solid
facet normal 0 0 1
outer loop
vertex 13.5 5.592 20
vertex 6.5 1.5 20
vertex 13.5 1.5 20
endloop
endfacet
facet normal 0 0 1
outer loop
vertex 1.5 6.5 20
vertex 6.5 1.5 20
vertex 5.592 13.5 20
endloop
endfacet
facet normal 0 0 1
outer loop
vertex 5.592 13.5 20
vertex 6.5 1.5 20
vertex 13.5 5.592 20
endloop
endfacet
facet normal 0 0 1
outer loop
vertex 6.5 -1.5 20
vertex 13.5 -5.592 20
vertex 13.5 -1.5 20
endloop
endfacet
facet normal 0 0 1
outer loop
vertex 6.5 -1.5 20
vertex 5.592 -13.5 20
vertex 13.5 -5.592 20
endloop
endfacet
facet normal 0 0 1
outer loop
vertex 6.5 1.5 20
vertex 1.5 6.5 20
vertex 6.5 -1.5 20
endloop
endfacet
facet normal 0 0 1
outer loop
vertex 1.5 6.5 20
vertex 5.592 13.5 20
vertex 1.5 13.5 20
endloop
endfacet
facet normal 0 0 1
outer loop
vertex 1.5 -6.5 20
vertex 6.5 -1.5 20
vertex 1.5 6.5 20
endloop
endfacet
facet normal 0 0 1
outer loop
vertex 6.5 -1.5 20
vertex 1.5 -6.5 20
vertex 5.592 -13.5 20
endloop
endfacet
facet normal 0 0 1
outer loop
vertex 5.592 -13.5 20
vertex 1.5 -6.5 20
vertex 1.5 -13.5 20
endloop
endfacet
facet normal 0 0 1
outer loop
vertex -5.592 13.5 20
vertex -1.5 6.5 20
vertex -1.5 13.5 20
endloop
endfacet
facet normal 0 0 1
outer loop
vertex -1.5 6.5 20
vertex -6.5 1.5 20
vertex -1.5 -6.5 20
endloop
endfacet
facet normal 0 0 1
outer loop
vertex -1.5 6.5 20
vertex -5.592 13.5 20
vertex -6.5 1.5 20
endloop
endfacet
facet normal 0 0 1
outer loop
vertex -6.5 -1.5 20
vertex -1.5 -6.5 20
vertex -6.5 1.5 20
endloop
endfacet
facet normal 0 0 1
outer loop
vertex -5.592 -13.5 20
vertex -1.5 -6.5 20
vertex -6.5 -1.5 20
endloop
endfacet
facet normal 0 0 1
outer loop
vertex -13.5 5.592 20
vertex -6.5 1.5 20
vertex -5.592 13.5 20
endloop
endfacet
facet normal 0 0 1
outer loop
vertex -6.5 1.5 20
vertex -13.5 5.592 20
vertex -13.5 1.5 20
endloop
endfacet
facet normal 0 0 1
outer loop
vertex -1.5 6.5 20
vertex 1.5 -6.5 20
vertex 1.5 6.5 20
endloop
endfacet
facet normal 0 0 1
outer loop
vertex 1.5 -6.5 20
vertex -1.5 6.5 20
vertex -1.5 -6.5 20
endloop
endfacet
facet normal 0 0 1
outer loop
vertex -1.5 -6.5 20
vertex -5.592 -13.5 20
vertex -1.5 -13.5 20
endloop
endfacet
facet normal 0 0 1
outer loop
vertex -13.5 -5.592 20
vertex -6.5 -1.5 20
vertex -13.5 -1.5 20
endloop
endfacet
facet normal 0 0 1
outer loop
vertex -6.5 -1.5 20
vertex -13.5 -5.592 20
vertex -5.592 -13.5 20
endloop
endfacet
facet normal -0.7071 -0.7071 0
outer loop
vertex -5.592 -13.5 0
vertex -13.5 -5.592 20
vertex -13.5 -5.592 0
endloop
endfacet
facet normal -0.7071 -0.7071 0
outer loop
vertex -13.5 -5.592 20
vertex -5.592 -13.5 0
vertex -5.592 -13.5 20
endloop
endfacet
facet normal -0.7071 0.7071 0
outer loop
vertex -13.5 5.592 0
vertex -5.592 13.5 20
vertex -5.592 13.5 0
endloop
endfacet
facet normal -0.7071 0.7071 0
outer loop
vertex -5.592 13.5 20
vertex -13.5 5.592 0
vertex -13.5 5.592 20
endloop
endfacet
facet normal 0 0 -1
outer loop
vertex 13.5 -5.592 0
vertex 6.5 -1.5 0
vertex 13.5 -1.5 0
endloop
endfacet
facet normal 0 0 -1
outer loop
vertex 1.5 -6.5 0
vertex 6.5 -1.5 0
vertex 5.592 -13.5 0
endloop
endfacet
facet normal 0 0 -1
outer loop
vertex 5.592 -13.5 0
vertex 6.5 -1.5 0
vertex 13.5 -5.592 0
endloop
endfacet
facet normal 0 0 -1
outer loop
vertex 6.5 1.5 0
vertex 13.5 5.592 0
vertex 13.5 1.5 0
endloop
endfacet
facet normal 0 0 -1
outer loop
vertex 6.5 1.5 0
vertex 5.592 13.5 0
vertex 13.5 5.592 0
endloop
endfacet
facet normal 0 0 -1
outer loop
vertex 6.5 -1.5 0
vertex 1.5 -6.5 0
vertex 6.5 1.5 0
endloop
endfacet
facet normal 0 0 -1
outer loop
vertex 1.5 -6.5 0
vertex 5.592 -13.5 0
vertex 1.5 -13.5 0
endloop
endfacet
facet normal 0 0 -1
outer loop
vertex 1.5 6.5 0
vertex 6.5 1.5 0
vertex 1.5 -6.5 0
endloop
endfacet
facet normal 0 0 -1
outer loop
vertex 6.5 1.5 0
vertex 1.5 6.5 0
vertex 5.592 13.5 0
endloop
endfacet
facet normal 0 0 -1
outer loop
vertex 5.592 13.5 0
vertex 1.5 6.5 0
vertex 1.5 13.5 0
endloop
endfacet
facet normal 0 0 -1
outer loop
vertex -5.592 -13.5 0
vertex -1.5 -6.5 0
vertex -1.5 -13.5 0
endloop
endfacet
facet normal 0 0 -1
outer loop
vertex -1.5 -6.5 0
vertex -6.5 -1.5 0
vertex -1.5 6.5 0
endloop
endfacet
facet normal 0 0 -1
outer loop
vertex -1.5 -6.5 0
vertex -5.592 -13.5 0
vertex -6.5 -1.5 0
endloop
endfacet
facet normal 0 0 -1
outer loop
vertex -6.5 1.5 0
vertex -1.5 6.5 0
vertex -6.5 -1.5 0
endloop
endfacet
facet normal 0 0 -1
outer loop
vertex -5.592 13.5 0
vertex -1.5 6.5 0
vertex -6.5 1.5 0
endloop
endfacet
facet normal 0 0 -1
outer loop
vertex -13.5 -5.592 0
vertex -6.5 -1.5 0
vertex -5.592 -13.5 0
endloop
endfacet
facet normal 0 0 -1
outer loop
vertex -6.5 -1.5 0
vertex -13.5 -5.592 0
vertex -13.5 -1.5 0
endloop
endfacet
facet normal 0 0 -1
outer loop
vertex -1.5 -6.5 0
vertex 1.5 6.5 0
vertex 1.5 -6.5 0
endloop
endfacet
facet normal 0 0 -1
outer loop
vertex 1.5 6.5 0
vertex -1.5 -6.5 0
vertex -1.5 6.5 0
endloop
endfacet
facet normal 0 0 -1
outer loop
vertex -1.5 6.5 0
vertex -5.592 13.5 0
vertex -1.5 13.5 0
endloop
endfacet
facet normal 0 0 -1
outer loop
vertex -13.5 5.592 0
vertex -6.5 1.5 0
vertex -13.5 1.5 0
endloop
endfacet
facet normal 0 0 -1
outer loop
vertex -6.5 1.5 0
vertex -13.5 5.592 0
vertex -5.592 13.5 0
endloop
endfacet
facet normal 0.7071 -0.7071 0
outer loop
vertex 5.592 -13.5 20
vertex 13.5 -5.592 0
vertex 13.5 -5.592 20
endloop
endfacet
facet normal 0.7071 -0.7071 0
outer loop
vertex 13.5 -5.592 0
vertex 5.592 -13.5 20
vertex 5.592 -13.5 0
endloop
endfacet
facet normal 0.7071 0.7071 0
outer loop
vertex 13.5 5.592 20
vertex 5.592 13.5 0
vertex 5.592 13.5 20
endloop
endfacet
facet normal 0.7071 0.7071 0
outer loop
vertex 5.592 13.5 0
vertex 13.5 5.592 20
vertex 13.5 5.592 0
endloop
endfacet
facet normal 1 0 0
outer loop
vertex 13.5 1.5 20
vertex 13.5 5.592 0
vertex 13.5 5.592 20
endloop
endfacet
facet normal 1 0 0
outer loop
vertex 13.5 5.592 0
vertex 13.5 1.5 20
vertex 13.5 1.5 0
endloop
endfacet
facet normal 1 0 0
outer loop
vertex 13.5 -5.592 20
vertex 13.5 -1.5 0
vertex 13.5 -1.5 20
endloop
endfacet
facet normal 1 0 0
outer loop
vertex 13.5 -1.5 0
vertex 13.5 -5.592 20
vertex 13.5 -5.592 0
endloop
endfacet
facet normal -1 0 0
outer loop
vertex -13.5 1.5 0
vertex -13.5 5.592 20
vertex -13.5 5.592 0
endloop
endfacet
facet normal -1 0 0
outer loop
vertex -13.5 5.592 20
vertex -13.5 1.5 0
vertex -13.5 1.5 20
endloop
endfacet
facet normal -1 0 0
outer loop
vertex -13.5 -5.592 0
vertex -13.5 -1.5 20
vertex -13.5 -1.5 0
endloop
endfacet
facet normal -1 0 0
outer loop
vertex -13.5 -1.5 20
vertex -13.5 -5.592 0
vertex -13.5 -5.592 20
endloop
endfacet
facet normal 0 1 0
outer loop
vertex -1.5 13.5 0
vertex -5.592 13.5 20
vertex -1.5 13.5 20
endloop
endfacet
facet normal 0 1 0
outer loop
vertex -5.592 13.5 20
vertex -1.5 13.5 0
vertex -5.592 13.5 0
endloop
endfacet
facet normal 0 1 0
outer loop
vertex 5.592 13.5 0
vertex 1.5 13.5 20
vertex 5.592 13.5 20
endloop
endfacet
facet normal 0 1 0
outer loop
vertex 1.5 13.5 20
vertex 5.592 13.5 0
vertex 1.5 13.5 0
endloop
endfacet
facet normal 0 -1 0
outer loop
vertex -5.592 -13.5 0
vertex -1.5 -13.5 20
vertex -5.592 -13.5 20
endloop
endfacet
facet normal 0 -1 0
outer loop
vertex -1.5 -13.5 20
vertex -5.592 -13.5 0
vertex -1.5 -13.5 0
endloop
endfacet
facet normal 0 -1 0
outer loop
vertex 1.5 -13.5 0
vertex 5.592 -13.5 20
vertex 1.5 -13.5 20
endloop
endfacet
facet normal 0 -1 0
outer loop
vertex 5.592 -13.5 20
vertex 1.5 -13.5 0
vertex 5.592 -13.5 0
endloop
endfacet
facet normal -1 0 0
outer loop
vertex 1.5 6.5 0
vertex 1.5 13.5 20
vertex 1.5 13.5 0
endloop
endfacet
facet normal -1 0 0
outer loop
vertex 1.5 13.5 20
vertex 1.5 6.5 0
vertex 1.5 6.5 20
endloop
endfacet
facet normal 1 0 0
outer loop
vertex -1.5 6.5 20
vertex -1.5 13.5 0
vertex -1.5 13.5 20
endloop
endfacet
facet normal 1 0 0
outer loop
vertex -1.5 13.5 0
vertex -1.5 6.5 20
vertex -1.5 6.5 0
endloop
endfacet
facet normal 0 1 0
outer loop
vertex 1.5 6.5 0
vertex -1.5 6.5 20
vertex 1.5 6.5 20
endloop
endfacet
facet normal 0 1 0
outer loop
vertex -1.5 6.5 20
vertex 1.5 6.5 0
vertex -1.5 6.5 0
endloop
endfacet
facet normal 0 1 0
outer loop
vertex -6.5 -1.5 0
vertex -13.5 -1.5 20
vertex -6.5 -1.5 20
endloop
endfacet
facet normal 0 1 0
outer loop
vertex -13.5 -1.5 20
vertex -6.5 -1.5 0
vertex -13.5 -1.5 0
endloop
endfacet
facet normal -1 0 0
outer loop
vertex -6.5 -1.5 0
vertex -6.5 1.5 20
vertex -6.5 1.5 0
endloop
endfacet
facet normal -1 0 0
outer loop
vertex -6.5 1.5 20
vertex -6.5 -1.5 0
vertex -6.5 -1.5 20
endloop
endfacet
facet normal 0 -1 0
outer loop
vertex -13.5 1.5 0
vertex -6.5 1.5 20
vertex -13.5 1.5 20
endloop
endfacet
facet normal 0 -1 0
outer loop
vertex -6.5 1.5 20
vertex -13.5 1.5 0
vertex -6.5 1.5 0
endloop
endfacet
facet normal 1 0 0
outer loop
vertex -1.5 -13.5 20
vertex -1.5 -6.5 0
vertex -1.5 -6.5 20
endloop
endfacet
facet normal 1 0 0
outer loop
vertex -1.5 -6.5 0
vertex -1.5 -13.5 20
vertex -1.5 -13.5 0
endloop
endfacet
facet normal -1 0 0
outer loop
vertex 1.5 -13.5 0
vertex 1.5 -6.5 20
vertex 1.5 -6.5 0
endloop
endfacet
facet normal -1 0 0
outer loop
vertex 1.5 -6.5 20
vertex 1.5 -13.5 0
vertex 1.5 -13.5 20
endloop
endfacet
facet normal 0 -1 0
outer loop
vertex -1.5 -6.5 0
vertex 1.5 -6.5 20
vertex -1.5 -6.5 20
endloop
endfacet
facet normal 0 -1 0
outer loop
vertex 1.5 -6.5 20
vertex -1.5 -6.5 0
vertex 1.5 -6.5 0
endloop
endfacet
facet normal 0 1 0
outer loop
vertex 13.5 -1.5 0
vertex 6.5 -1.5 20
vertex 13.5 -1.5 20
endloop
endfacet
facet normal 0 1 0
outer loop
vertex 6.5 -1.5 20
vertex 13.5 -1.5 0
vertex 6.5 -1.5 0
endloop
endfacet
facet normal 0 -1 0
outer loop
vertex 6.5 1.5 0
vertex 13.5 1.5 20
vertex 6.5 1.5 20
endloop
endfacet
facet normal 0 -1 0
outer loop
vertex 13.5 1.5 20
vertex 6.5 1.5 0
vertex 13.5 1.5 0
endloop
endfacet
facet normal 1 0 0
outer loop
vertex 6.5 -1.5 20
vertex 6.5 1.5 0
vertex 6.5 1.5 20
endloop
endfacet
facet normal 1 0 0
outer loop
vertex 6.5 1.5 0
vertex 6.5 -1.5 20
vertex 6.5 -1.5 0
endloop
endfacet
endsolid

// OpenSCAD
//Created by Dave Borghuis aka zeno4ever
//Inspired by blender object by Govert Gombe

//Size
size = 27; // [1:100]
//Height
height = 20; // [1:100]
//Cut Size
cutsize = 3; // [1:100]
//Cut Depth
cutdepth = 7; // [1:100]

translate([0,0,height/2]) 
difference() {
    //make main cube
    intersection() {
        rotate([0,0,45]) cube([size,size,height],center=true);
        cube([size,size,height],center=true);
    };
    //make cuts
    for(side = [0 : 90 : 360]) {
        rotate([0,0,side]) translate([0,size-cutdepth,0]) cube([cutsize,size,height],center=true);
    };
};
